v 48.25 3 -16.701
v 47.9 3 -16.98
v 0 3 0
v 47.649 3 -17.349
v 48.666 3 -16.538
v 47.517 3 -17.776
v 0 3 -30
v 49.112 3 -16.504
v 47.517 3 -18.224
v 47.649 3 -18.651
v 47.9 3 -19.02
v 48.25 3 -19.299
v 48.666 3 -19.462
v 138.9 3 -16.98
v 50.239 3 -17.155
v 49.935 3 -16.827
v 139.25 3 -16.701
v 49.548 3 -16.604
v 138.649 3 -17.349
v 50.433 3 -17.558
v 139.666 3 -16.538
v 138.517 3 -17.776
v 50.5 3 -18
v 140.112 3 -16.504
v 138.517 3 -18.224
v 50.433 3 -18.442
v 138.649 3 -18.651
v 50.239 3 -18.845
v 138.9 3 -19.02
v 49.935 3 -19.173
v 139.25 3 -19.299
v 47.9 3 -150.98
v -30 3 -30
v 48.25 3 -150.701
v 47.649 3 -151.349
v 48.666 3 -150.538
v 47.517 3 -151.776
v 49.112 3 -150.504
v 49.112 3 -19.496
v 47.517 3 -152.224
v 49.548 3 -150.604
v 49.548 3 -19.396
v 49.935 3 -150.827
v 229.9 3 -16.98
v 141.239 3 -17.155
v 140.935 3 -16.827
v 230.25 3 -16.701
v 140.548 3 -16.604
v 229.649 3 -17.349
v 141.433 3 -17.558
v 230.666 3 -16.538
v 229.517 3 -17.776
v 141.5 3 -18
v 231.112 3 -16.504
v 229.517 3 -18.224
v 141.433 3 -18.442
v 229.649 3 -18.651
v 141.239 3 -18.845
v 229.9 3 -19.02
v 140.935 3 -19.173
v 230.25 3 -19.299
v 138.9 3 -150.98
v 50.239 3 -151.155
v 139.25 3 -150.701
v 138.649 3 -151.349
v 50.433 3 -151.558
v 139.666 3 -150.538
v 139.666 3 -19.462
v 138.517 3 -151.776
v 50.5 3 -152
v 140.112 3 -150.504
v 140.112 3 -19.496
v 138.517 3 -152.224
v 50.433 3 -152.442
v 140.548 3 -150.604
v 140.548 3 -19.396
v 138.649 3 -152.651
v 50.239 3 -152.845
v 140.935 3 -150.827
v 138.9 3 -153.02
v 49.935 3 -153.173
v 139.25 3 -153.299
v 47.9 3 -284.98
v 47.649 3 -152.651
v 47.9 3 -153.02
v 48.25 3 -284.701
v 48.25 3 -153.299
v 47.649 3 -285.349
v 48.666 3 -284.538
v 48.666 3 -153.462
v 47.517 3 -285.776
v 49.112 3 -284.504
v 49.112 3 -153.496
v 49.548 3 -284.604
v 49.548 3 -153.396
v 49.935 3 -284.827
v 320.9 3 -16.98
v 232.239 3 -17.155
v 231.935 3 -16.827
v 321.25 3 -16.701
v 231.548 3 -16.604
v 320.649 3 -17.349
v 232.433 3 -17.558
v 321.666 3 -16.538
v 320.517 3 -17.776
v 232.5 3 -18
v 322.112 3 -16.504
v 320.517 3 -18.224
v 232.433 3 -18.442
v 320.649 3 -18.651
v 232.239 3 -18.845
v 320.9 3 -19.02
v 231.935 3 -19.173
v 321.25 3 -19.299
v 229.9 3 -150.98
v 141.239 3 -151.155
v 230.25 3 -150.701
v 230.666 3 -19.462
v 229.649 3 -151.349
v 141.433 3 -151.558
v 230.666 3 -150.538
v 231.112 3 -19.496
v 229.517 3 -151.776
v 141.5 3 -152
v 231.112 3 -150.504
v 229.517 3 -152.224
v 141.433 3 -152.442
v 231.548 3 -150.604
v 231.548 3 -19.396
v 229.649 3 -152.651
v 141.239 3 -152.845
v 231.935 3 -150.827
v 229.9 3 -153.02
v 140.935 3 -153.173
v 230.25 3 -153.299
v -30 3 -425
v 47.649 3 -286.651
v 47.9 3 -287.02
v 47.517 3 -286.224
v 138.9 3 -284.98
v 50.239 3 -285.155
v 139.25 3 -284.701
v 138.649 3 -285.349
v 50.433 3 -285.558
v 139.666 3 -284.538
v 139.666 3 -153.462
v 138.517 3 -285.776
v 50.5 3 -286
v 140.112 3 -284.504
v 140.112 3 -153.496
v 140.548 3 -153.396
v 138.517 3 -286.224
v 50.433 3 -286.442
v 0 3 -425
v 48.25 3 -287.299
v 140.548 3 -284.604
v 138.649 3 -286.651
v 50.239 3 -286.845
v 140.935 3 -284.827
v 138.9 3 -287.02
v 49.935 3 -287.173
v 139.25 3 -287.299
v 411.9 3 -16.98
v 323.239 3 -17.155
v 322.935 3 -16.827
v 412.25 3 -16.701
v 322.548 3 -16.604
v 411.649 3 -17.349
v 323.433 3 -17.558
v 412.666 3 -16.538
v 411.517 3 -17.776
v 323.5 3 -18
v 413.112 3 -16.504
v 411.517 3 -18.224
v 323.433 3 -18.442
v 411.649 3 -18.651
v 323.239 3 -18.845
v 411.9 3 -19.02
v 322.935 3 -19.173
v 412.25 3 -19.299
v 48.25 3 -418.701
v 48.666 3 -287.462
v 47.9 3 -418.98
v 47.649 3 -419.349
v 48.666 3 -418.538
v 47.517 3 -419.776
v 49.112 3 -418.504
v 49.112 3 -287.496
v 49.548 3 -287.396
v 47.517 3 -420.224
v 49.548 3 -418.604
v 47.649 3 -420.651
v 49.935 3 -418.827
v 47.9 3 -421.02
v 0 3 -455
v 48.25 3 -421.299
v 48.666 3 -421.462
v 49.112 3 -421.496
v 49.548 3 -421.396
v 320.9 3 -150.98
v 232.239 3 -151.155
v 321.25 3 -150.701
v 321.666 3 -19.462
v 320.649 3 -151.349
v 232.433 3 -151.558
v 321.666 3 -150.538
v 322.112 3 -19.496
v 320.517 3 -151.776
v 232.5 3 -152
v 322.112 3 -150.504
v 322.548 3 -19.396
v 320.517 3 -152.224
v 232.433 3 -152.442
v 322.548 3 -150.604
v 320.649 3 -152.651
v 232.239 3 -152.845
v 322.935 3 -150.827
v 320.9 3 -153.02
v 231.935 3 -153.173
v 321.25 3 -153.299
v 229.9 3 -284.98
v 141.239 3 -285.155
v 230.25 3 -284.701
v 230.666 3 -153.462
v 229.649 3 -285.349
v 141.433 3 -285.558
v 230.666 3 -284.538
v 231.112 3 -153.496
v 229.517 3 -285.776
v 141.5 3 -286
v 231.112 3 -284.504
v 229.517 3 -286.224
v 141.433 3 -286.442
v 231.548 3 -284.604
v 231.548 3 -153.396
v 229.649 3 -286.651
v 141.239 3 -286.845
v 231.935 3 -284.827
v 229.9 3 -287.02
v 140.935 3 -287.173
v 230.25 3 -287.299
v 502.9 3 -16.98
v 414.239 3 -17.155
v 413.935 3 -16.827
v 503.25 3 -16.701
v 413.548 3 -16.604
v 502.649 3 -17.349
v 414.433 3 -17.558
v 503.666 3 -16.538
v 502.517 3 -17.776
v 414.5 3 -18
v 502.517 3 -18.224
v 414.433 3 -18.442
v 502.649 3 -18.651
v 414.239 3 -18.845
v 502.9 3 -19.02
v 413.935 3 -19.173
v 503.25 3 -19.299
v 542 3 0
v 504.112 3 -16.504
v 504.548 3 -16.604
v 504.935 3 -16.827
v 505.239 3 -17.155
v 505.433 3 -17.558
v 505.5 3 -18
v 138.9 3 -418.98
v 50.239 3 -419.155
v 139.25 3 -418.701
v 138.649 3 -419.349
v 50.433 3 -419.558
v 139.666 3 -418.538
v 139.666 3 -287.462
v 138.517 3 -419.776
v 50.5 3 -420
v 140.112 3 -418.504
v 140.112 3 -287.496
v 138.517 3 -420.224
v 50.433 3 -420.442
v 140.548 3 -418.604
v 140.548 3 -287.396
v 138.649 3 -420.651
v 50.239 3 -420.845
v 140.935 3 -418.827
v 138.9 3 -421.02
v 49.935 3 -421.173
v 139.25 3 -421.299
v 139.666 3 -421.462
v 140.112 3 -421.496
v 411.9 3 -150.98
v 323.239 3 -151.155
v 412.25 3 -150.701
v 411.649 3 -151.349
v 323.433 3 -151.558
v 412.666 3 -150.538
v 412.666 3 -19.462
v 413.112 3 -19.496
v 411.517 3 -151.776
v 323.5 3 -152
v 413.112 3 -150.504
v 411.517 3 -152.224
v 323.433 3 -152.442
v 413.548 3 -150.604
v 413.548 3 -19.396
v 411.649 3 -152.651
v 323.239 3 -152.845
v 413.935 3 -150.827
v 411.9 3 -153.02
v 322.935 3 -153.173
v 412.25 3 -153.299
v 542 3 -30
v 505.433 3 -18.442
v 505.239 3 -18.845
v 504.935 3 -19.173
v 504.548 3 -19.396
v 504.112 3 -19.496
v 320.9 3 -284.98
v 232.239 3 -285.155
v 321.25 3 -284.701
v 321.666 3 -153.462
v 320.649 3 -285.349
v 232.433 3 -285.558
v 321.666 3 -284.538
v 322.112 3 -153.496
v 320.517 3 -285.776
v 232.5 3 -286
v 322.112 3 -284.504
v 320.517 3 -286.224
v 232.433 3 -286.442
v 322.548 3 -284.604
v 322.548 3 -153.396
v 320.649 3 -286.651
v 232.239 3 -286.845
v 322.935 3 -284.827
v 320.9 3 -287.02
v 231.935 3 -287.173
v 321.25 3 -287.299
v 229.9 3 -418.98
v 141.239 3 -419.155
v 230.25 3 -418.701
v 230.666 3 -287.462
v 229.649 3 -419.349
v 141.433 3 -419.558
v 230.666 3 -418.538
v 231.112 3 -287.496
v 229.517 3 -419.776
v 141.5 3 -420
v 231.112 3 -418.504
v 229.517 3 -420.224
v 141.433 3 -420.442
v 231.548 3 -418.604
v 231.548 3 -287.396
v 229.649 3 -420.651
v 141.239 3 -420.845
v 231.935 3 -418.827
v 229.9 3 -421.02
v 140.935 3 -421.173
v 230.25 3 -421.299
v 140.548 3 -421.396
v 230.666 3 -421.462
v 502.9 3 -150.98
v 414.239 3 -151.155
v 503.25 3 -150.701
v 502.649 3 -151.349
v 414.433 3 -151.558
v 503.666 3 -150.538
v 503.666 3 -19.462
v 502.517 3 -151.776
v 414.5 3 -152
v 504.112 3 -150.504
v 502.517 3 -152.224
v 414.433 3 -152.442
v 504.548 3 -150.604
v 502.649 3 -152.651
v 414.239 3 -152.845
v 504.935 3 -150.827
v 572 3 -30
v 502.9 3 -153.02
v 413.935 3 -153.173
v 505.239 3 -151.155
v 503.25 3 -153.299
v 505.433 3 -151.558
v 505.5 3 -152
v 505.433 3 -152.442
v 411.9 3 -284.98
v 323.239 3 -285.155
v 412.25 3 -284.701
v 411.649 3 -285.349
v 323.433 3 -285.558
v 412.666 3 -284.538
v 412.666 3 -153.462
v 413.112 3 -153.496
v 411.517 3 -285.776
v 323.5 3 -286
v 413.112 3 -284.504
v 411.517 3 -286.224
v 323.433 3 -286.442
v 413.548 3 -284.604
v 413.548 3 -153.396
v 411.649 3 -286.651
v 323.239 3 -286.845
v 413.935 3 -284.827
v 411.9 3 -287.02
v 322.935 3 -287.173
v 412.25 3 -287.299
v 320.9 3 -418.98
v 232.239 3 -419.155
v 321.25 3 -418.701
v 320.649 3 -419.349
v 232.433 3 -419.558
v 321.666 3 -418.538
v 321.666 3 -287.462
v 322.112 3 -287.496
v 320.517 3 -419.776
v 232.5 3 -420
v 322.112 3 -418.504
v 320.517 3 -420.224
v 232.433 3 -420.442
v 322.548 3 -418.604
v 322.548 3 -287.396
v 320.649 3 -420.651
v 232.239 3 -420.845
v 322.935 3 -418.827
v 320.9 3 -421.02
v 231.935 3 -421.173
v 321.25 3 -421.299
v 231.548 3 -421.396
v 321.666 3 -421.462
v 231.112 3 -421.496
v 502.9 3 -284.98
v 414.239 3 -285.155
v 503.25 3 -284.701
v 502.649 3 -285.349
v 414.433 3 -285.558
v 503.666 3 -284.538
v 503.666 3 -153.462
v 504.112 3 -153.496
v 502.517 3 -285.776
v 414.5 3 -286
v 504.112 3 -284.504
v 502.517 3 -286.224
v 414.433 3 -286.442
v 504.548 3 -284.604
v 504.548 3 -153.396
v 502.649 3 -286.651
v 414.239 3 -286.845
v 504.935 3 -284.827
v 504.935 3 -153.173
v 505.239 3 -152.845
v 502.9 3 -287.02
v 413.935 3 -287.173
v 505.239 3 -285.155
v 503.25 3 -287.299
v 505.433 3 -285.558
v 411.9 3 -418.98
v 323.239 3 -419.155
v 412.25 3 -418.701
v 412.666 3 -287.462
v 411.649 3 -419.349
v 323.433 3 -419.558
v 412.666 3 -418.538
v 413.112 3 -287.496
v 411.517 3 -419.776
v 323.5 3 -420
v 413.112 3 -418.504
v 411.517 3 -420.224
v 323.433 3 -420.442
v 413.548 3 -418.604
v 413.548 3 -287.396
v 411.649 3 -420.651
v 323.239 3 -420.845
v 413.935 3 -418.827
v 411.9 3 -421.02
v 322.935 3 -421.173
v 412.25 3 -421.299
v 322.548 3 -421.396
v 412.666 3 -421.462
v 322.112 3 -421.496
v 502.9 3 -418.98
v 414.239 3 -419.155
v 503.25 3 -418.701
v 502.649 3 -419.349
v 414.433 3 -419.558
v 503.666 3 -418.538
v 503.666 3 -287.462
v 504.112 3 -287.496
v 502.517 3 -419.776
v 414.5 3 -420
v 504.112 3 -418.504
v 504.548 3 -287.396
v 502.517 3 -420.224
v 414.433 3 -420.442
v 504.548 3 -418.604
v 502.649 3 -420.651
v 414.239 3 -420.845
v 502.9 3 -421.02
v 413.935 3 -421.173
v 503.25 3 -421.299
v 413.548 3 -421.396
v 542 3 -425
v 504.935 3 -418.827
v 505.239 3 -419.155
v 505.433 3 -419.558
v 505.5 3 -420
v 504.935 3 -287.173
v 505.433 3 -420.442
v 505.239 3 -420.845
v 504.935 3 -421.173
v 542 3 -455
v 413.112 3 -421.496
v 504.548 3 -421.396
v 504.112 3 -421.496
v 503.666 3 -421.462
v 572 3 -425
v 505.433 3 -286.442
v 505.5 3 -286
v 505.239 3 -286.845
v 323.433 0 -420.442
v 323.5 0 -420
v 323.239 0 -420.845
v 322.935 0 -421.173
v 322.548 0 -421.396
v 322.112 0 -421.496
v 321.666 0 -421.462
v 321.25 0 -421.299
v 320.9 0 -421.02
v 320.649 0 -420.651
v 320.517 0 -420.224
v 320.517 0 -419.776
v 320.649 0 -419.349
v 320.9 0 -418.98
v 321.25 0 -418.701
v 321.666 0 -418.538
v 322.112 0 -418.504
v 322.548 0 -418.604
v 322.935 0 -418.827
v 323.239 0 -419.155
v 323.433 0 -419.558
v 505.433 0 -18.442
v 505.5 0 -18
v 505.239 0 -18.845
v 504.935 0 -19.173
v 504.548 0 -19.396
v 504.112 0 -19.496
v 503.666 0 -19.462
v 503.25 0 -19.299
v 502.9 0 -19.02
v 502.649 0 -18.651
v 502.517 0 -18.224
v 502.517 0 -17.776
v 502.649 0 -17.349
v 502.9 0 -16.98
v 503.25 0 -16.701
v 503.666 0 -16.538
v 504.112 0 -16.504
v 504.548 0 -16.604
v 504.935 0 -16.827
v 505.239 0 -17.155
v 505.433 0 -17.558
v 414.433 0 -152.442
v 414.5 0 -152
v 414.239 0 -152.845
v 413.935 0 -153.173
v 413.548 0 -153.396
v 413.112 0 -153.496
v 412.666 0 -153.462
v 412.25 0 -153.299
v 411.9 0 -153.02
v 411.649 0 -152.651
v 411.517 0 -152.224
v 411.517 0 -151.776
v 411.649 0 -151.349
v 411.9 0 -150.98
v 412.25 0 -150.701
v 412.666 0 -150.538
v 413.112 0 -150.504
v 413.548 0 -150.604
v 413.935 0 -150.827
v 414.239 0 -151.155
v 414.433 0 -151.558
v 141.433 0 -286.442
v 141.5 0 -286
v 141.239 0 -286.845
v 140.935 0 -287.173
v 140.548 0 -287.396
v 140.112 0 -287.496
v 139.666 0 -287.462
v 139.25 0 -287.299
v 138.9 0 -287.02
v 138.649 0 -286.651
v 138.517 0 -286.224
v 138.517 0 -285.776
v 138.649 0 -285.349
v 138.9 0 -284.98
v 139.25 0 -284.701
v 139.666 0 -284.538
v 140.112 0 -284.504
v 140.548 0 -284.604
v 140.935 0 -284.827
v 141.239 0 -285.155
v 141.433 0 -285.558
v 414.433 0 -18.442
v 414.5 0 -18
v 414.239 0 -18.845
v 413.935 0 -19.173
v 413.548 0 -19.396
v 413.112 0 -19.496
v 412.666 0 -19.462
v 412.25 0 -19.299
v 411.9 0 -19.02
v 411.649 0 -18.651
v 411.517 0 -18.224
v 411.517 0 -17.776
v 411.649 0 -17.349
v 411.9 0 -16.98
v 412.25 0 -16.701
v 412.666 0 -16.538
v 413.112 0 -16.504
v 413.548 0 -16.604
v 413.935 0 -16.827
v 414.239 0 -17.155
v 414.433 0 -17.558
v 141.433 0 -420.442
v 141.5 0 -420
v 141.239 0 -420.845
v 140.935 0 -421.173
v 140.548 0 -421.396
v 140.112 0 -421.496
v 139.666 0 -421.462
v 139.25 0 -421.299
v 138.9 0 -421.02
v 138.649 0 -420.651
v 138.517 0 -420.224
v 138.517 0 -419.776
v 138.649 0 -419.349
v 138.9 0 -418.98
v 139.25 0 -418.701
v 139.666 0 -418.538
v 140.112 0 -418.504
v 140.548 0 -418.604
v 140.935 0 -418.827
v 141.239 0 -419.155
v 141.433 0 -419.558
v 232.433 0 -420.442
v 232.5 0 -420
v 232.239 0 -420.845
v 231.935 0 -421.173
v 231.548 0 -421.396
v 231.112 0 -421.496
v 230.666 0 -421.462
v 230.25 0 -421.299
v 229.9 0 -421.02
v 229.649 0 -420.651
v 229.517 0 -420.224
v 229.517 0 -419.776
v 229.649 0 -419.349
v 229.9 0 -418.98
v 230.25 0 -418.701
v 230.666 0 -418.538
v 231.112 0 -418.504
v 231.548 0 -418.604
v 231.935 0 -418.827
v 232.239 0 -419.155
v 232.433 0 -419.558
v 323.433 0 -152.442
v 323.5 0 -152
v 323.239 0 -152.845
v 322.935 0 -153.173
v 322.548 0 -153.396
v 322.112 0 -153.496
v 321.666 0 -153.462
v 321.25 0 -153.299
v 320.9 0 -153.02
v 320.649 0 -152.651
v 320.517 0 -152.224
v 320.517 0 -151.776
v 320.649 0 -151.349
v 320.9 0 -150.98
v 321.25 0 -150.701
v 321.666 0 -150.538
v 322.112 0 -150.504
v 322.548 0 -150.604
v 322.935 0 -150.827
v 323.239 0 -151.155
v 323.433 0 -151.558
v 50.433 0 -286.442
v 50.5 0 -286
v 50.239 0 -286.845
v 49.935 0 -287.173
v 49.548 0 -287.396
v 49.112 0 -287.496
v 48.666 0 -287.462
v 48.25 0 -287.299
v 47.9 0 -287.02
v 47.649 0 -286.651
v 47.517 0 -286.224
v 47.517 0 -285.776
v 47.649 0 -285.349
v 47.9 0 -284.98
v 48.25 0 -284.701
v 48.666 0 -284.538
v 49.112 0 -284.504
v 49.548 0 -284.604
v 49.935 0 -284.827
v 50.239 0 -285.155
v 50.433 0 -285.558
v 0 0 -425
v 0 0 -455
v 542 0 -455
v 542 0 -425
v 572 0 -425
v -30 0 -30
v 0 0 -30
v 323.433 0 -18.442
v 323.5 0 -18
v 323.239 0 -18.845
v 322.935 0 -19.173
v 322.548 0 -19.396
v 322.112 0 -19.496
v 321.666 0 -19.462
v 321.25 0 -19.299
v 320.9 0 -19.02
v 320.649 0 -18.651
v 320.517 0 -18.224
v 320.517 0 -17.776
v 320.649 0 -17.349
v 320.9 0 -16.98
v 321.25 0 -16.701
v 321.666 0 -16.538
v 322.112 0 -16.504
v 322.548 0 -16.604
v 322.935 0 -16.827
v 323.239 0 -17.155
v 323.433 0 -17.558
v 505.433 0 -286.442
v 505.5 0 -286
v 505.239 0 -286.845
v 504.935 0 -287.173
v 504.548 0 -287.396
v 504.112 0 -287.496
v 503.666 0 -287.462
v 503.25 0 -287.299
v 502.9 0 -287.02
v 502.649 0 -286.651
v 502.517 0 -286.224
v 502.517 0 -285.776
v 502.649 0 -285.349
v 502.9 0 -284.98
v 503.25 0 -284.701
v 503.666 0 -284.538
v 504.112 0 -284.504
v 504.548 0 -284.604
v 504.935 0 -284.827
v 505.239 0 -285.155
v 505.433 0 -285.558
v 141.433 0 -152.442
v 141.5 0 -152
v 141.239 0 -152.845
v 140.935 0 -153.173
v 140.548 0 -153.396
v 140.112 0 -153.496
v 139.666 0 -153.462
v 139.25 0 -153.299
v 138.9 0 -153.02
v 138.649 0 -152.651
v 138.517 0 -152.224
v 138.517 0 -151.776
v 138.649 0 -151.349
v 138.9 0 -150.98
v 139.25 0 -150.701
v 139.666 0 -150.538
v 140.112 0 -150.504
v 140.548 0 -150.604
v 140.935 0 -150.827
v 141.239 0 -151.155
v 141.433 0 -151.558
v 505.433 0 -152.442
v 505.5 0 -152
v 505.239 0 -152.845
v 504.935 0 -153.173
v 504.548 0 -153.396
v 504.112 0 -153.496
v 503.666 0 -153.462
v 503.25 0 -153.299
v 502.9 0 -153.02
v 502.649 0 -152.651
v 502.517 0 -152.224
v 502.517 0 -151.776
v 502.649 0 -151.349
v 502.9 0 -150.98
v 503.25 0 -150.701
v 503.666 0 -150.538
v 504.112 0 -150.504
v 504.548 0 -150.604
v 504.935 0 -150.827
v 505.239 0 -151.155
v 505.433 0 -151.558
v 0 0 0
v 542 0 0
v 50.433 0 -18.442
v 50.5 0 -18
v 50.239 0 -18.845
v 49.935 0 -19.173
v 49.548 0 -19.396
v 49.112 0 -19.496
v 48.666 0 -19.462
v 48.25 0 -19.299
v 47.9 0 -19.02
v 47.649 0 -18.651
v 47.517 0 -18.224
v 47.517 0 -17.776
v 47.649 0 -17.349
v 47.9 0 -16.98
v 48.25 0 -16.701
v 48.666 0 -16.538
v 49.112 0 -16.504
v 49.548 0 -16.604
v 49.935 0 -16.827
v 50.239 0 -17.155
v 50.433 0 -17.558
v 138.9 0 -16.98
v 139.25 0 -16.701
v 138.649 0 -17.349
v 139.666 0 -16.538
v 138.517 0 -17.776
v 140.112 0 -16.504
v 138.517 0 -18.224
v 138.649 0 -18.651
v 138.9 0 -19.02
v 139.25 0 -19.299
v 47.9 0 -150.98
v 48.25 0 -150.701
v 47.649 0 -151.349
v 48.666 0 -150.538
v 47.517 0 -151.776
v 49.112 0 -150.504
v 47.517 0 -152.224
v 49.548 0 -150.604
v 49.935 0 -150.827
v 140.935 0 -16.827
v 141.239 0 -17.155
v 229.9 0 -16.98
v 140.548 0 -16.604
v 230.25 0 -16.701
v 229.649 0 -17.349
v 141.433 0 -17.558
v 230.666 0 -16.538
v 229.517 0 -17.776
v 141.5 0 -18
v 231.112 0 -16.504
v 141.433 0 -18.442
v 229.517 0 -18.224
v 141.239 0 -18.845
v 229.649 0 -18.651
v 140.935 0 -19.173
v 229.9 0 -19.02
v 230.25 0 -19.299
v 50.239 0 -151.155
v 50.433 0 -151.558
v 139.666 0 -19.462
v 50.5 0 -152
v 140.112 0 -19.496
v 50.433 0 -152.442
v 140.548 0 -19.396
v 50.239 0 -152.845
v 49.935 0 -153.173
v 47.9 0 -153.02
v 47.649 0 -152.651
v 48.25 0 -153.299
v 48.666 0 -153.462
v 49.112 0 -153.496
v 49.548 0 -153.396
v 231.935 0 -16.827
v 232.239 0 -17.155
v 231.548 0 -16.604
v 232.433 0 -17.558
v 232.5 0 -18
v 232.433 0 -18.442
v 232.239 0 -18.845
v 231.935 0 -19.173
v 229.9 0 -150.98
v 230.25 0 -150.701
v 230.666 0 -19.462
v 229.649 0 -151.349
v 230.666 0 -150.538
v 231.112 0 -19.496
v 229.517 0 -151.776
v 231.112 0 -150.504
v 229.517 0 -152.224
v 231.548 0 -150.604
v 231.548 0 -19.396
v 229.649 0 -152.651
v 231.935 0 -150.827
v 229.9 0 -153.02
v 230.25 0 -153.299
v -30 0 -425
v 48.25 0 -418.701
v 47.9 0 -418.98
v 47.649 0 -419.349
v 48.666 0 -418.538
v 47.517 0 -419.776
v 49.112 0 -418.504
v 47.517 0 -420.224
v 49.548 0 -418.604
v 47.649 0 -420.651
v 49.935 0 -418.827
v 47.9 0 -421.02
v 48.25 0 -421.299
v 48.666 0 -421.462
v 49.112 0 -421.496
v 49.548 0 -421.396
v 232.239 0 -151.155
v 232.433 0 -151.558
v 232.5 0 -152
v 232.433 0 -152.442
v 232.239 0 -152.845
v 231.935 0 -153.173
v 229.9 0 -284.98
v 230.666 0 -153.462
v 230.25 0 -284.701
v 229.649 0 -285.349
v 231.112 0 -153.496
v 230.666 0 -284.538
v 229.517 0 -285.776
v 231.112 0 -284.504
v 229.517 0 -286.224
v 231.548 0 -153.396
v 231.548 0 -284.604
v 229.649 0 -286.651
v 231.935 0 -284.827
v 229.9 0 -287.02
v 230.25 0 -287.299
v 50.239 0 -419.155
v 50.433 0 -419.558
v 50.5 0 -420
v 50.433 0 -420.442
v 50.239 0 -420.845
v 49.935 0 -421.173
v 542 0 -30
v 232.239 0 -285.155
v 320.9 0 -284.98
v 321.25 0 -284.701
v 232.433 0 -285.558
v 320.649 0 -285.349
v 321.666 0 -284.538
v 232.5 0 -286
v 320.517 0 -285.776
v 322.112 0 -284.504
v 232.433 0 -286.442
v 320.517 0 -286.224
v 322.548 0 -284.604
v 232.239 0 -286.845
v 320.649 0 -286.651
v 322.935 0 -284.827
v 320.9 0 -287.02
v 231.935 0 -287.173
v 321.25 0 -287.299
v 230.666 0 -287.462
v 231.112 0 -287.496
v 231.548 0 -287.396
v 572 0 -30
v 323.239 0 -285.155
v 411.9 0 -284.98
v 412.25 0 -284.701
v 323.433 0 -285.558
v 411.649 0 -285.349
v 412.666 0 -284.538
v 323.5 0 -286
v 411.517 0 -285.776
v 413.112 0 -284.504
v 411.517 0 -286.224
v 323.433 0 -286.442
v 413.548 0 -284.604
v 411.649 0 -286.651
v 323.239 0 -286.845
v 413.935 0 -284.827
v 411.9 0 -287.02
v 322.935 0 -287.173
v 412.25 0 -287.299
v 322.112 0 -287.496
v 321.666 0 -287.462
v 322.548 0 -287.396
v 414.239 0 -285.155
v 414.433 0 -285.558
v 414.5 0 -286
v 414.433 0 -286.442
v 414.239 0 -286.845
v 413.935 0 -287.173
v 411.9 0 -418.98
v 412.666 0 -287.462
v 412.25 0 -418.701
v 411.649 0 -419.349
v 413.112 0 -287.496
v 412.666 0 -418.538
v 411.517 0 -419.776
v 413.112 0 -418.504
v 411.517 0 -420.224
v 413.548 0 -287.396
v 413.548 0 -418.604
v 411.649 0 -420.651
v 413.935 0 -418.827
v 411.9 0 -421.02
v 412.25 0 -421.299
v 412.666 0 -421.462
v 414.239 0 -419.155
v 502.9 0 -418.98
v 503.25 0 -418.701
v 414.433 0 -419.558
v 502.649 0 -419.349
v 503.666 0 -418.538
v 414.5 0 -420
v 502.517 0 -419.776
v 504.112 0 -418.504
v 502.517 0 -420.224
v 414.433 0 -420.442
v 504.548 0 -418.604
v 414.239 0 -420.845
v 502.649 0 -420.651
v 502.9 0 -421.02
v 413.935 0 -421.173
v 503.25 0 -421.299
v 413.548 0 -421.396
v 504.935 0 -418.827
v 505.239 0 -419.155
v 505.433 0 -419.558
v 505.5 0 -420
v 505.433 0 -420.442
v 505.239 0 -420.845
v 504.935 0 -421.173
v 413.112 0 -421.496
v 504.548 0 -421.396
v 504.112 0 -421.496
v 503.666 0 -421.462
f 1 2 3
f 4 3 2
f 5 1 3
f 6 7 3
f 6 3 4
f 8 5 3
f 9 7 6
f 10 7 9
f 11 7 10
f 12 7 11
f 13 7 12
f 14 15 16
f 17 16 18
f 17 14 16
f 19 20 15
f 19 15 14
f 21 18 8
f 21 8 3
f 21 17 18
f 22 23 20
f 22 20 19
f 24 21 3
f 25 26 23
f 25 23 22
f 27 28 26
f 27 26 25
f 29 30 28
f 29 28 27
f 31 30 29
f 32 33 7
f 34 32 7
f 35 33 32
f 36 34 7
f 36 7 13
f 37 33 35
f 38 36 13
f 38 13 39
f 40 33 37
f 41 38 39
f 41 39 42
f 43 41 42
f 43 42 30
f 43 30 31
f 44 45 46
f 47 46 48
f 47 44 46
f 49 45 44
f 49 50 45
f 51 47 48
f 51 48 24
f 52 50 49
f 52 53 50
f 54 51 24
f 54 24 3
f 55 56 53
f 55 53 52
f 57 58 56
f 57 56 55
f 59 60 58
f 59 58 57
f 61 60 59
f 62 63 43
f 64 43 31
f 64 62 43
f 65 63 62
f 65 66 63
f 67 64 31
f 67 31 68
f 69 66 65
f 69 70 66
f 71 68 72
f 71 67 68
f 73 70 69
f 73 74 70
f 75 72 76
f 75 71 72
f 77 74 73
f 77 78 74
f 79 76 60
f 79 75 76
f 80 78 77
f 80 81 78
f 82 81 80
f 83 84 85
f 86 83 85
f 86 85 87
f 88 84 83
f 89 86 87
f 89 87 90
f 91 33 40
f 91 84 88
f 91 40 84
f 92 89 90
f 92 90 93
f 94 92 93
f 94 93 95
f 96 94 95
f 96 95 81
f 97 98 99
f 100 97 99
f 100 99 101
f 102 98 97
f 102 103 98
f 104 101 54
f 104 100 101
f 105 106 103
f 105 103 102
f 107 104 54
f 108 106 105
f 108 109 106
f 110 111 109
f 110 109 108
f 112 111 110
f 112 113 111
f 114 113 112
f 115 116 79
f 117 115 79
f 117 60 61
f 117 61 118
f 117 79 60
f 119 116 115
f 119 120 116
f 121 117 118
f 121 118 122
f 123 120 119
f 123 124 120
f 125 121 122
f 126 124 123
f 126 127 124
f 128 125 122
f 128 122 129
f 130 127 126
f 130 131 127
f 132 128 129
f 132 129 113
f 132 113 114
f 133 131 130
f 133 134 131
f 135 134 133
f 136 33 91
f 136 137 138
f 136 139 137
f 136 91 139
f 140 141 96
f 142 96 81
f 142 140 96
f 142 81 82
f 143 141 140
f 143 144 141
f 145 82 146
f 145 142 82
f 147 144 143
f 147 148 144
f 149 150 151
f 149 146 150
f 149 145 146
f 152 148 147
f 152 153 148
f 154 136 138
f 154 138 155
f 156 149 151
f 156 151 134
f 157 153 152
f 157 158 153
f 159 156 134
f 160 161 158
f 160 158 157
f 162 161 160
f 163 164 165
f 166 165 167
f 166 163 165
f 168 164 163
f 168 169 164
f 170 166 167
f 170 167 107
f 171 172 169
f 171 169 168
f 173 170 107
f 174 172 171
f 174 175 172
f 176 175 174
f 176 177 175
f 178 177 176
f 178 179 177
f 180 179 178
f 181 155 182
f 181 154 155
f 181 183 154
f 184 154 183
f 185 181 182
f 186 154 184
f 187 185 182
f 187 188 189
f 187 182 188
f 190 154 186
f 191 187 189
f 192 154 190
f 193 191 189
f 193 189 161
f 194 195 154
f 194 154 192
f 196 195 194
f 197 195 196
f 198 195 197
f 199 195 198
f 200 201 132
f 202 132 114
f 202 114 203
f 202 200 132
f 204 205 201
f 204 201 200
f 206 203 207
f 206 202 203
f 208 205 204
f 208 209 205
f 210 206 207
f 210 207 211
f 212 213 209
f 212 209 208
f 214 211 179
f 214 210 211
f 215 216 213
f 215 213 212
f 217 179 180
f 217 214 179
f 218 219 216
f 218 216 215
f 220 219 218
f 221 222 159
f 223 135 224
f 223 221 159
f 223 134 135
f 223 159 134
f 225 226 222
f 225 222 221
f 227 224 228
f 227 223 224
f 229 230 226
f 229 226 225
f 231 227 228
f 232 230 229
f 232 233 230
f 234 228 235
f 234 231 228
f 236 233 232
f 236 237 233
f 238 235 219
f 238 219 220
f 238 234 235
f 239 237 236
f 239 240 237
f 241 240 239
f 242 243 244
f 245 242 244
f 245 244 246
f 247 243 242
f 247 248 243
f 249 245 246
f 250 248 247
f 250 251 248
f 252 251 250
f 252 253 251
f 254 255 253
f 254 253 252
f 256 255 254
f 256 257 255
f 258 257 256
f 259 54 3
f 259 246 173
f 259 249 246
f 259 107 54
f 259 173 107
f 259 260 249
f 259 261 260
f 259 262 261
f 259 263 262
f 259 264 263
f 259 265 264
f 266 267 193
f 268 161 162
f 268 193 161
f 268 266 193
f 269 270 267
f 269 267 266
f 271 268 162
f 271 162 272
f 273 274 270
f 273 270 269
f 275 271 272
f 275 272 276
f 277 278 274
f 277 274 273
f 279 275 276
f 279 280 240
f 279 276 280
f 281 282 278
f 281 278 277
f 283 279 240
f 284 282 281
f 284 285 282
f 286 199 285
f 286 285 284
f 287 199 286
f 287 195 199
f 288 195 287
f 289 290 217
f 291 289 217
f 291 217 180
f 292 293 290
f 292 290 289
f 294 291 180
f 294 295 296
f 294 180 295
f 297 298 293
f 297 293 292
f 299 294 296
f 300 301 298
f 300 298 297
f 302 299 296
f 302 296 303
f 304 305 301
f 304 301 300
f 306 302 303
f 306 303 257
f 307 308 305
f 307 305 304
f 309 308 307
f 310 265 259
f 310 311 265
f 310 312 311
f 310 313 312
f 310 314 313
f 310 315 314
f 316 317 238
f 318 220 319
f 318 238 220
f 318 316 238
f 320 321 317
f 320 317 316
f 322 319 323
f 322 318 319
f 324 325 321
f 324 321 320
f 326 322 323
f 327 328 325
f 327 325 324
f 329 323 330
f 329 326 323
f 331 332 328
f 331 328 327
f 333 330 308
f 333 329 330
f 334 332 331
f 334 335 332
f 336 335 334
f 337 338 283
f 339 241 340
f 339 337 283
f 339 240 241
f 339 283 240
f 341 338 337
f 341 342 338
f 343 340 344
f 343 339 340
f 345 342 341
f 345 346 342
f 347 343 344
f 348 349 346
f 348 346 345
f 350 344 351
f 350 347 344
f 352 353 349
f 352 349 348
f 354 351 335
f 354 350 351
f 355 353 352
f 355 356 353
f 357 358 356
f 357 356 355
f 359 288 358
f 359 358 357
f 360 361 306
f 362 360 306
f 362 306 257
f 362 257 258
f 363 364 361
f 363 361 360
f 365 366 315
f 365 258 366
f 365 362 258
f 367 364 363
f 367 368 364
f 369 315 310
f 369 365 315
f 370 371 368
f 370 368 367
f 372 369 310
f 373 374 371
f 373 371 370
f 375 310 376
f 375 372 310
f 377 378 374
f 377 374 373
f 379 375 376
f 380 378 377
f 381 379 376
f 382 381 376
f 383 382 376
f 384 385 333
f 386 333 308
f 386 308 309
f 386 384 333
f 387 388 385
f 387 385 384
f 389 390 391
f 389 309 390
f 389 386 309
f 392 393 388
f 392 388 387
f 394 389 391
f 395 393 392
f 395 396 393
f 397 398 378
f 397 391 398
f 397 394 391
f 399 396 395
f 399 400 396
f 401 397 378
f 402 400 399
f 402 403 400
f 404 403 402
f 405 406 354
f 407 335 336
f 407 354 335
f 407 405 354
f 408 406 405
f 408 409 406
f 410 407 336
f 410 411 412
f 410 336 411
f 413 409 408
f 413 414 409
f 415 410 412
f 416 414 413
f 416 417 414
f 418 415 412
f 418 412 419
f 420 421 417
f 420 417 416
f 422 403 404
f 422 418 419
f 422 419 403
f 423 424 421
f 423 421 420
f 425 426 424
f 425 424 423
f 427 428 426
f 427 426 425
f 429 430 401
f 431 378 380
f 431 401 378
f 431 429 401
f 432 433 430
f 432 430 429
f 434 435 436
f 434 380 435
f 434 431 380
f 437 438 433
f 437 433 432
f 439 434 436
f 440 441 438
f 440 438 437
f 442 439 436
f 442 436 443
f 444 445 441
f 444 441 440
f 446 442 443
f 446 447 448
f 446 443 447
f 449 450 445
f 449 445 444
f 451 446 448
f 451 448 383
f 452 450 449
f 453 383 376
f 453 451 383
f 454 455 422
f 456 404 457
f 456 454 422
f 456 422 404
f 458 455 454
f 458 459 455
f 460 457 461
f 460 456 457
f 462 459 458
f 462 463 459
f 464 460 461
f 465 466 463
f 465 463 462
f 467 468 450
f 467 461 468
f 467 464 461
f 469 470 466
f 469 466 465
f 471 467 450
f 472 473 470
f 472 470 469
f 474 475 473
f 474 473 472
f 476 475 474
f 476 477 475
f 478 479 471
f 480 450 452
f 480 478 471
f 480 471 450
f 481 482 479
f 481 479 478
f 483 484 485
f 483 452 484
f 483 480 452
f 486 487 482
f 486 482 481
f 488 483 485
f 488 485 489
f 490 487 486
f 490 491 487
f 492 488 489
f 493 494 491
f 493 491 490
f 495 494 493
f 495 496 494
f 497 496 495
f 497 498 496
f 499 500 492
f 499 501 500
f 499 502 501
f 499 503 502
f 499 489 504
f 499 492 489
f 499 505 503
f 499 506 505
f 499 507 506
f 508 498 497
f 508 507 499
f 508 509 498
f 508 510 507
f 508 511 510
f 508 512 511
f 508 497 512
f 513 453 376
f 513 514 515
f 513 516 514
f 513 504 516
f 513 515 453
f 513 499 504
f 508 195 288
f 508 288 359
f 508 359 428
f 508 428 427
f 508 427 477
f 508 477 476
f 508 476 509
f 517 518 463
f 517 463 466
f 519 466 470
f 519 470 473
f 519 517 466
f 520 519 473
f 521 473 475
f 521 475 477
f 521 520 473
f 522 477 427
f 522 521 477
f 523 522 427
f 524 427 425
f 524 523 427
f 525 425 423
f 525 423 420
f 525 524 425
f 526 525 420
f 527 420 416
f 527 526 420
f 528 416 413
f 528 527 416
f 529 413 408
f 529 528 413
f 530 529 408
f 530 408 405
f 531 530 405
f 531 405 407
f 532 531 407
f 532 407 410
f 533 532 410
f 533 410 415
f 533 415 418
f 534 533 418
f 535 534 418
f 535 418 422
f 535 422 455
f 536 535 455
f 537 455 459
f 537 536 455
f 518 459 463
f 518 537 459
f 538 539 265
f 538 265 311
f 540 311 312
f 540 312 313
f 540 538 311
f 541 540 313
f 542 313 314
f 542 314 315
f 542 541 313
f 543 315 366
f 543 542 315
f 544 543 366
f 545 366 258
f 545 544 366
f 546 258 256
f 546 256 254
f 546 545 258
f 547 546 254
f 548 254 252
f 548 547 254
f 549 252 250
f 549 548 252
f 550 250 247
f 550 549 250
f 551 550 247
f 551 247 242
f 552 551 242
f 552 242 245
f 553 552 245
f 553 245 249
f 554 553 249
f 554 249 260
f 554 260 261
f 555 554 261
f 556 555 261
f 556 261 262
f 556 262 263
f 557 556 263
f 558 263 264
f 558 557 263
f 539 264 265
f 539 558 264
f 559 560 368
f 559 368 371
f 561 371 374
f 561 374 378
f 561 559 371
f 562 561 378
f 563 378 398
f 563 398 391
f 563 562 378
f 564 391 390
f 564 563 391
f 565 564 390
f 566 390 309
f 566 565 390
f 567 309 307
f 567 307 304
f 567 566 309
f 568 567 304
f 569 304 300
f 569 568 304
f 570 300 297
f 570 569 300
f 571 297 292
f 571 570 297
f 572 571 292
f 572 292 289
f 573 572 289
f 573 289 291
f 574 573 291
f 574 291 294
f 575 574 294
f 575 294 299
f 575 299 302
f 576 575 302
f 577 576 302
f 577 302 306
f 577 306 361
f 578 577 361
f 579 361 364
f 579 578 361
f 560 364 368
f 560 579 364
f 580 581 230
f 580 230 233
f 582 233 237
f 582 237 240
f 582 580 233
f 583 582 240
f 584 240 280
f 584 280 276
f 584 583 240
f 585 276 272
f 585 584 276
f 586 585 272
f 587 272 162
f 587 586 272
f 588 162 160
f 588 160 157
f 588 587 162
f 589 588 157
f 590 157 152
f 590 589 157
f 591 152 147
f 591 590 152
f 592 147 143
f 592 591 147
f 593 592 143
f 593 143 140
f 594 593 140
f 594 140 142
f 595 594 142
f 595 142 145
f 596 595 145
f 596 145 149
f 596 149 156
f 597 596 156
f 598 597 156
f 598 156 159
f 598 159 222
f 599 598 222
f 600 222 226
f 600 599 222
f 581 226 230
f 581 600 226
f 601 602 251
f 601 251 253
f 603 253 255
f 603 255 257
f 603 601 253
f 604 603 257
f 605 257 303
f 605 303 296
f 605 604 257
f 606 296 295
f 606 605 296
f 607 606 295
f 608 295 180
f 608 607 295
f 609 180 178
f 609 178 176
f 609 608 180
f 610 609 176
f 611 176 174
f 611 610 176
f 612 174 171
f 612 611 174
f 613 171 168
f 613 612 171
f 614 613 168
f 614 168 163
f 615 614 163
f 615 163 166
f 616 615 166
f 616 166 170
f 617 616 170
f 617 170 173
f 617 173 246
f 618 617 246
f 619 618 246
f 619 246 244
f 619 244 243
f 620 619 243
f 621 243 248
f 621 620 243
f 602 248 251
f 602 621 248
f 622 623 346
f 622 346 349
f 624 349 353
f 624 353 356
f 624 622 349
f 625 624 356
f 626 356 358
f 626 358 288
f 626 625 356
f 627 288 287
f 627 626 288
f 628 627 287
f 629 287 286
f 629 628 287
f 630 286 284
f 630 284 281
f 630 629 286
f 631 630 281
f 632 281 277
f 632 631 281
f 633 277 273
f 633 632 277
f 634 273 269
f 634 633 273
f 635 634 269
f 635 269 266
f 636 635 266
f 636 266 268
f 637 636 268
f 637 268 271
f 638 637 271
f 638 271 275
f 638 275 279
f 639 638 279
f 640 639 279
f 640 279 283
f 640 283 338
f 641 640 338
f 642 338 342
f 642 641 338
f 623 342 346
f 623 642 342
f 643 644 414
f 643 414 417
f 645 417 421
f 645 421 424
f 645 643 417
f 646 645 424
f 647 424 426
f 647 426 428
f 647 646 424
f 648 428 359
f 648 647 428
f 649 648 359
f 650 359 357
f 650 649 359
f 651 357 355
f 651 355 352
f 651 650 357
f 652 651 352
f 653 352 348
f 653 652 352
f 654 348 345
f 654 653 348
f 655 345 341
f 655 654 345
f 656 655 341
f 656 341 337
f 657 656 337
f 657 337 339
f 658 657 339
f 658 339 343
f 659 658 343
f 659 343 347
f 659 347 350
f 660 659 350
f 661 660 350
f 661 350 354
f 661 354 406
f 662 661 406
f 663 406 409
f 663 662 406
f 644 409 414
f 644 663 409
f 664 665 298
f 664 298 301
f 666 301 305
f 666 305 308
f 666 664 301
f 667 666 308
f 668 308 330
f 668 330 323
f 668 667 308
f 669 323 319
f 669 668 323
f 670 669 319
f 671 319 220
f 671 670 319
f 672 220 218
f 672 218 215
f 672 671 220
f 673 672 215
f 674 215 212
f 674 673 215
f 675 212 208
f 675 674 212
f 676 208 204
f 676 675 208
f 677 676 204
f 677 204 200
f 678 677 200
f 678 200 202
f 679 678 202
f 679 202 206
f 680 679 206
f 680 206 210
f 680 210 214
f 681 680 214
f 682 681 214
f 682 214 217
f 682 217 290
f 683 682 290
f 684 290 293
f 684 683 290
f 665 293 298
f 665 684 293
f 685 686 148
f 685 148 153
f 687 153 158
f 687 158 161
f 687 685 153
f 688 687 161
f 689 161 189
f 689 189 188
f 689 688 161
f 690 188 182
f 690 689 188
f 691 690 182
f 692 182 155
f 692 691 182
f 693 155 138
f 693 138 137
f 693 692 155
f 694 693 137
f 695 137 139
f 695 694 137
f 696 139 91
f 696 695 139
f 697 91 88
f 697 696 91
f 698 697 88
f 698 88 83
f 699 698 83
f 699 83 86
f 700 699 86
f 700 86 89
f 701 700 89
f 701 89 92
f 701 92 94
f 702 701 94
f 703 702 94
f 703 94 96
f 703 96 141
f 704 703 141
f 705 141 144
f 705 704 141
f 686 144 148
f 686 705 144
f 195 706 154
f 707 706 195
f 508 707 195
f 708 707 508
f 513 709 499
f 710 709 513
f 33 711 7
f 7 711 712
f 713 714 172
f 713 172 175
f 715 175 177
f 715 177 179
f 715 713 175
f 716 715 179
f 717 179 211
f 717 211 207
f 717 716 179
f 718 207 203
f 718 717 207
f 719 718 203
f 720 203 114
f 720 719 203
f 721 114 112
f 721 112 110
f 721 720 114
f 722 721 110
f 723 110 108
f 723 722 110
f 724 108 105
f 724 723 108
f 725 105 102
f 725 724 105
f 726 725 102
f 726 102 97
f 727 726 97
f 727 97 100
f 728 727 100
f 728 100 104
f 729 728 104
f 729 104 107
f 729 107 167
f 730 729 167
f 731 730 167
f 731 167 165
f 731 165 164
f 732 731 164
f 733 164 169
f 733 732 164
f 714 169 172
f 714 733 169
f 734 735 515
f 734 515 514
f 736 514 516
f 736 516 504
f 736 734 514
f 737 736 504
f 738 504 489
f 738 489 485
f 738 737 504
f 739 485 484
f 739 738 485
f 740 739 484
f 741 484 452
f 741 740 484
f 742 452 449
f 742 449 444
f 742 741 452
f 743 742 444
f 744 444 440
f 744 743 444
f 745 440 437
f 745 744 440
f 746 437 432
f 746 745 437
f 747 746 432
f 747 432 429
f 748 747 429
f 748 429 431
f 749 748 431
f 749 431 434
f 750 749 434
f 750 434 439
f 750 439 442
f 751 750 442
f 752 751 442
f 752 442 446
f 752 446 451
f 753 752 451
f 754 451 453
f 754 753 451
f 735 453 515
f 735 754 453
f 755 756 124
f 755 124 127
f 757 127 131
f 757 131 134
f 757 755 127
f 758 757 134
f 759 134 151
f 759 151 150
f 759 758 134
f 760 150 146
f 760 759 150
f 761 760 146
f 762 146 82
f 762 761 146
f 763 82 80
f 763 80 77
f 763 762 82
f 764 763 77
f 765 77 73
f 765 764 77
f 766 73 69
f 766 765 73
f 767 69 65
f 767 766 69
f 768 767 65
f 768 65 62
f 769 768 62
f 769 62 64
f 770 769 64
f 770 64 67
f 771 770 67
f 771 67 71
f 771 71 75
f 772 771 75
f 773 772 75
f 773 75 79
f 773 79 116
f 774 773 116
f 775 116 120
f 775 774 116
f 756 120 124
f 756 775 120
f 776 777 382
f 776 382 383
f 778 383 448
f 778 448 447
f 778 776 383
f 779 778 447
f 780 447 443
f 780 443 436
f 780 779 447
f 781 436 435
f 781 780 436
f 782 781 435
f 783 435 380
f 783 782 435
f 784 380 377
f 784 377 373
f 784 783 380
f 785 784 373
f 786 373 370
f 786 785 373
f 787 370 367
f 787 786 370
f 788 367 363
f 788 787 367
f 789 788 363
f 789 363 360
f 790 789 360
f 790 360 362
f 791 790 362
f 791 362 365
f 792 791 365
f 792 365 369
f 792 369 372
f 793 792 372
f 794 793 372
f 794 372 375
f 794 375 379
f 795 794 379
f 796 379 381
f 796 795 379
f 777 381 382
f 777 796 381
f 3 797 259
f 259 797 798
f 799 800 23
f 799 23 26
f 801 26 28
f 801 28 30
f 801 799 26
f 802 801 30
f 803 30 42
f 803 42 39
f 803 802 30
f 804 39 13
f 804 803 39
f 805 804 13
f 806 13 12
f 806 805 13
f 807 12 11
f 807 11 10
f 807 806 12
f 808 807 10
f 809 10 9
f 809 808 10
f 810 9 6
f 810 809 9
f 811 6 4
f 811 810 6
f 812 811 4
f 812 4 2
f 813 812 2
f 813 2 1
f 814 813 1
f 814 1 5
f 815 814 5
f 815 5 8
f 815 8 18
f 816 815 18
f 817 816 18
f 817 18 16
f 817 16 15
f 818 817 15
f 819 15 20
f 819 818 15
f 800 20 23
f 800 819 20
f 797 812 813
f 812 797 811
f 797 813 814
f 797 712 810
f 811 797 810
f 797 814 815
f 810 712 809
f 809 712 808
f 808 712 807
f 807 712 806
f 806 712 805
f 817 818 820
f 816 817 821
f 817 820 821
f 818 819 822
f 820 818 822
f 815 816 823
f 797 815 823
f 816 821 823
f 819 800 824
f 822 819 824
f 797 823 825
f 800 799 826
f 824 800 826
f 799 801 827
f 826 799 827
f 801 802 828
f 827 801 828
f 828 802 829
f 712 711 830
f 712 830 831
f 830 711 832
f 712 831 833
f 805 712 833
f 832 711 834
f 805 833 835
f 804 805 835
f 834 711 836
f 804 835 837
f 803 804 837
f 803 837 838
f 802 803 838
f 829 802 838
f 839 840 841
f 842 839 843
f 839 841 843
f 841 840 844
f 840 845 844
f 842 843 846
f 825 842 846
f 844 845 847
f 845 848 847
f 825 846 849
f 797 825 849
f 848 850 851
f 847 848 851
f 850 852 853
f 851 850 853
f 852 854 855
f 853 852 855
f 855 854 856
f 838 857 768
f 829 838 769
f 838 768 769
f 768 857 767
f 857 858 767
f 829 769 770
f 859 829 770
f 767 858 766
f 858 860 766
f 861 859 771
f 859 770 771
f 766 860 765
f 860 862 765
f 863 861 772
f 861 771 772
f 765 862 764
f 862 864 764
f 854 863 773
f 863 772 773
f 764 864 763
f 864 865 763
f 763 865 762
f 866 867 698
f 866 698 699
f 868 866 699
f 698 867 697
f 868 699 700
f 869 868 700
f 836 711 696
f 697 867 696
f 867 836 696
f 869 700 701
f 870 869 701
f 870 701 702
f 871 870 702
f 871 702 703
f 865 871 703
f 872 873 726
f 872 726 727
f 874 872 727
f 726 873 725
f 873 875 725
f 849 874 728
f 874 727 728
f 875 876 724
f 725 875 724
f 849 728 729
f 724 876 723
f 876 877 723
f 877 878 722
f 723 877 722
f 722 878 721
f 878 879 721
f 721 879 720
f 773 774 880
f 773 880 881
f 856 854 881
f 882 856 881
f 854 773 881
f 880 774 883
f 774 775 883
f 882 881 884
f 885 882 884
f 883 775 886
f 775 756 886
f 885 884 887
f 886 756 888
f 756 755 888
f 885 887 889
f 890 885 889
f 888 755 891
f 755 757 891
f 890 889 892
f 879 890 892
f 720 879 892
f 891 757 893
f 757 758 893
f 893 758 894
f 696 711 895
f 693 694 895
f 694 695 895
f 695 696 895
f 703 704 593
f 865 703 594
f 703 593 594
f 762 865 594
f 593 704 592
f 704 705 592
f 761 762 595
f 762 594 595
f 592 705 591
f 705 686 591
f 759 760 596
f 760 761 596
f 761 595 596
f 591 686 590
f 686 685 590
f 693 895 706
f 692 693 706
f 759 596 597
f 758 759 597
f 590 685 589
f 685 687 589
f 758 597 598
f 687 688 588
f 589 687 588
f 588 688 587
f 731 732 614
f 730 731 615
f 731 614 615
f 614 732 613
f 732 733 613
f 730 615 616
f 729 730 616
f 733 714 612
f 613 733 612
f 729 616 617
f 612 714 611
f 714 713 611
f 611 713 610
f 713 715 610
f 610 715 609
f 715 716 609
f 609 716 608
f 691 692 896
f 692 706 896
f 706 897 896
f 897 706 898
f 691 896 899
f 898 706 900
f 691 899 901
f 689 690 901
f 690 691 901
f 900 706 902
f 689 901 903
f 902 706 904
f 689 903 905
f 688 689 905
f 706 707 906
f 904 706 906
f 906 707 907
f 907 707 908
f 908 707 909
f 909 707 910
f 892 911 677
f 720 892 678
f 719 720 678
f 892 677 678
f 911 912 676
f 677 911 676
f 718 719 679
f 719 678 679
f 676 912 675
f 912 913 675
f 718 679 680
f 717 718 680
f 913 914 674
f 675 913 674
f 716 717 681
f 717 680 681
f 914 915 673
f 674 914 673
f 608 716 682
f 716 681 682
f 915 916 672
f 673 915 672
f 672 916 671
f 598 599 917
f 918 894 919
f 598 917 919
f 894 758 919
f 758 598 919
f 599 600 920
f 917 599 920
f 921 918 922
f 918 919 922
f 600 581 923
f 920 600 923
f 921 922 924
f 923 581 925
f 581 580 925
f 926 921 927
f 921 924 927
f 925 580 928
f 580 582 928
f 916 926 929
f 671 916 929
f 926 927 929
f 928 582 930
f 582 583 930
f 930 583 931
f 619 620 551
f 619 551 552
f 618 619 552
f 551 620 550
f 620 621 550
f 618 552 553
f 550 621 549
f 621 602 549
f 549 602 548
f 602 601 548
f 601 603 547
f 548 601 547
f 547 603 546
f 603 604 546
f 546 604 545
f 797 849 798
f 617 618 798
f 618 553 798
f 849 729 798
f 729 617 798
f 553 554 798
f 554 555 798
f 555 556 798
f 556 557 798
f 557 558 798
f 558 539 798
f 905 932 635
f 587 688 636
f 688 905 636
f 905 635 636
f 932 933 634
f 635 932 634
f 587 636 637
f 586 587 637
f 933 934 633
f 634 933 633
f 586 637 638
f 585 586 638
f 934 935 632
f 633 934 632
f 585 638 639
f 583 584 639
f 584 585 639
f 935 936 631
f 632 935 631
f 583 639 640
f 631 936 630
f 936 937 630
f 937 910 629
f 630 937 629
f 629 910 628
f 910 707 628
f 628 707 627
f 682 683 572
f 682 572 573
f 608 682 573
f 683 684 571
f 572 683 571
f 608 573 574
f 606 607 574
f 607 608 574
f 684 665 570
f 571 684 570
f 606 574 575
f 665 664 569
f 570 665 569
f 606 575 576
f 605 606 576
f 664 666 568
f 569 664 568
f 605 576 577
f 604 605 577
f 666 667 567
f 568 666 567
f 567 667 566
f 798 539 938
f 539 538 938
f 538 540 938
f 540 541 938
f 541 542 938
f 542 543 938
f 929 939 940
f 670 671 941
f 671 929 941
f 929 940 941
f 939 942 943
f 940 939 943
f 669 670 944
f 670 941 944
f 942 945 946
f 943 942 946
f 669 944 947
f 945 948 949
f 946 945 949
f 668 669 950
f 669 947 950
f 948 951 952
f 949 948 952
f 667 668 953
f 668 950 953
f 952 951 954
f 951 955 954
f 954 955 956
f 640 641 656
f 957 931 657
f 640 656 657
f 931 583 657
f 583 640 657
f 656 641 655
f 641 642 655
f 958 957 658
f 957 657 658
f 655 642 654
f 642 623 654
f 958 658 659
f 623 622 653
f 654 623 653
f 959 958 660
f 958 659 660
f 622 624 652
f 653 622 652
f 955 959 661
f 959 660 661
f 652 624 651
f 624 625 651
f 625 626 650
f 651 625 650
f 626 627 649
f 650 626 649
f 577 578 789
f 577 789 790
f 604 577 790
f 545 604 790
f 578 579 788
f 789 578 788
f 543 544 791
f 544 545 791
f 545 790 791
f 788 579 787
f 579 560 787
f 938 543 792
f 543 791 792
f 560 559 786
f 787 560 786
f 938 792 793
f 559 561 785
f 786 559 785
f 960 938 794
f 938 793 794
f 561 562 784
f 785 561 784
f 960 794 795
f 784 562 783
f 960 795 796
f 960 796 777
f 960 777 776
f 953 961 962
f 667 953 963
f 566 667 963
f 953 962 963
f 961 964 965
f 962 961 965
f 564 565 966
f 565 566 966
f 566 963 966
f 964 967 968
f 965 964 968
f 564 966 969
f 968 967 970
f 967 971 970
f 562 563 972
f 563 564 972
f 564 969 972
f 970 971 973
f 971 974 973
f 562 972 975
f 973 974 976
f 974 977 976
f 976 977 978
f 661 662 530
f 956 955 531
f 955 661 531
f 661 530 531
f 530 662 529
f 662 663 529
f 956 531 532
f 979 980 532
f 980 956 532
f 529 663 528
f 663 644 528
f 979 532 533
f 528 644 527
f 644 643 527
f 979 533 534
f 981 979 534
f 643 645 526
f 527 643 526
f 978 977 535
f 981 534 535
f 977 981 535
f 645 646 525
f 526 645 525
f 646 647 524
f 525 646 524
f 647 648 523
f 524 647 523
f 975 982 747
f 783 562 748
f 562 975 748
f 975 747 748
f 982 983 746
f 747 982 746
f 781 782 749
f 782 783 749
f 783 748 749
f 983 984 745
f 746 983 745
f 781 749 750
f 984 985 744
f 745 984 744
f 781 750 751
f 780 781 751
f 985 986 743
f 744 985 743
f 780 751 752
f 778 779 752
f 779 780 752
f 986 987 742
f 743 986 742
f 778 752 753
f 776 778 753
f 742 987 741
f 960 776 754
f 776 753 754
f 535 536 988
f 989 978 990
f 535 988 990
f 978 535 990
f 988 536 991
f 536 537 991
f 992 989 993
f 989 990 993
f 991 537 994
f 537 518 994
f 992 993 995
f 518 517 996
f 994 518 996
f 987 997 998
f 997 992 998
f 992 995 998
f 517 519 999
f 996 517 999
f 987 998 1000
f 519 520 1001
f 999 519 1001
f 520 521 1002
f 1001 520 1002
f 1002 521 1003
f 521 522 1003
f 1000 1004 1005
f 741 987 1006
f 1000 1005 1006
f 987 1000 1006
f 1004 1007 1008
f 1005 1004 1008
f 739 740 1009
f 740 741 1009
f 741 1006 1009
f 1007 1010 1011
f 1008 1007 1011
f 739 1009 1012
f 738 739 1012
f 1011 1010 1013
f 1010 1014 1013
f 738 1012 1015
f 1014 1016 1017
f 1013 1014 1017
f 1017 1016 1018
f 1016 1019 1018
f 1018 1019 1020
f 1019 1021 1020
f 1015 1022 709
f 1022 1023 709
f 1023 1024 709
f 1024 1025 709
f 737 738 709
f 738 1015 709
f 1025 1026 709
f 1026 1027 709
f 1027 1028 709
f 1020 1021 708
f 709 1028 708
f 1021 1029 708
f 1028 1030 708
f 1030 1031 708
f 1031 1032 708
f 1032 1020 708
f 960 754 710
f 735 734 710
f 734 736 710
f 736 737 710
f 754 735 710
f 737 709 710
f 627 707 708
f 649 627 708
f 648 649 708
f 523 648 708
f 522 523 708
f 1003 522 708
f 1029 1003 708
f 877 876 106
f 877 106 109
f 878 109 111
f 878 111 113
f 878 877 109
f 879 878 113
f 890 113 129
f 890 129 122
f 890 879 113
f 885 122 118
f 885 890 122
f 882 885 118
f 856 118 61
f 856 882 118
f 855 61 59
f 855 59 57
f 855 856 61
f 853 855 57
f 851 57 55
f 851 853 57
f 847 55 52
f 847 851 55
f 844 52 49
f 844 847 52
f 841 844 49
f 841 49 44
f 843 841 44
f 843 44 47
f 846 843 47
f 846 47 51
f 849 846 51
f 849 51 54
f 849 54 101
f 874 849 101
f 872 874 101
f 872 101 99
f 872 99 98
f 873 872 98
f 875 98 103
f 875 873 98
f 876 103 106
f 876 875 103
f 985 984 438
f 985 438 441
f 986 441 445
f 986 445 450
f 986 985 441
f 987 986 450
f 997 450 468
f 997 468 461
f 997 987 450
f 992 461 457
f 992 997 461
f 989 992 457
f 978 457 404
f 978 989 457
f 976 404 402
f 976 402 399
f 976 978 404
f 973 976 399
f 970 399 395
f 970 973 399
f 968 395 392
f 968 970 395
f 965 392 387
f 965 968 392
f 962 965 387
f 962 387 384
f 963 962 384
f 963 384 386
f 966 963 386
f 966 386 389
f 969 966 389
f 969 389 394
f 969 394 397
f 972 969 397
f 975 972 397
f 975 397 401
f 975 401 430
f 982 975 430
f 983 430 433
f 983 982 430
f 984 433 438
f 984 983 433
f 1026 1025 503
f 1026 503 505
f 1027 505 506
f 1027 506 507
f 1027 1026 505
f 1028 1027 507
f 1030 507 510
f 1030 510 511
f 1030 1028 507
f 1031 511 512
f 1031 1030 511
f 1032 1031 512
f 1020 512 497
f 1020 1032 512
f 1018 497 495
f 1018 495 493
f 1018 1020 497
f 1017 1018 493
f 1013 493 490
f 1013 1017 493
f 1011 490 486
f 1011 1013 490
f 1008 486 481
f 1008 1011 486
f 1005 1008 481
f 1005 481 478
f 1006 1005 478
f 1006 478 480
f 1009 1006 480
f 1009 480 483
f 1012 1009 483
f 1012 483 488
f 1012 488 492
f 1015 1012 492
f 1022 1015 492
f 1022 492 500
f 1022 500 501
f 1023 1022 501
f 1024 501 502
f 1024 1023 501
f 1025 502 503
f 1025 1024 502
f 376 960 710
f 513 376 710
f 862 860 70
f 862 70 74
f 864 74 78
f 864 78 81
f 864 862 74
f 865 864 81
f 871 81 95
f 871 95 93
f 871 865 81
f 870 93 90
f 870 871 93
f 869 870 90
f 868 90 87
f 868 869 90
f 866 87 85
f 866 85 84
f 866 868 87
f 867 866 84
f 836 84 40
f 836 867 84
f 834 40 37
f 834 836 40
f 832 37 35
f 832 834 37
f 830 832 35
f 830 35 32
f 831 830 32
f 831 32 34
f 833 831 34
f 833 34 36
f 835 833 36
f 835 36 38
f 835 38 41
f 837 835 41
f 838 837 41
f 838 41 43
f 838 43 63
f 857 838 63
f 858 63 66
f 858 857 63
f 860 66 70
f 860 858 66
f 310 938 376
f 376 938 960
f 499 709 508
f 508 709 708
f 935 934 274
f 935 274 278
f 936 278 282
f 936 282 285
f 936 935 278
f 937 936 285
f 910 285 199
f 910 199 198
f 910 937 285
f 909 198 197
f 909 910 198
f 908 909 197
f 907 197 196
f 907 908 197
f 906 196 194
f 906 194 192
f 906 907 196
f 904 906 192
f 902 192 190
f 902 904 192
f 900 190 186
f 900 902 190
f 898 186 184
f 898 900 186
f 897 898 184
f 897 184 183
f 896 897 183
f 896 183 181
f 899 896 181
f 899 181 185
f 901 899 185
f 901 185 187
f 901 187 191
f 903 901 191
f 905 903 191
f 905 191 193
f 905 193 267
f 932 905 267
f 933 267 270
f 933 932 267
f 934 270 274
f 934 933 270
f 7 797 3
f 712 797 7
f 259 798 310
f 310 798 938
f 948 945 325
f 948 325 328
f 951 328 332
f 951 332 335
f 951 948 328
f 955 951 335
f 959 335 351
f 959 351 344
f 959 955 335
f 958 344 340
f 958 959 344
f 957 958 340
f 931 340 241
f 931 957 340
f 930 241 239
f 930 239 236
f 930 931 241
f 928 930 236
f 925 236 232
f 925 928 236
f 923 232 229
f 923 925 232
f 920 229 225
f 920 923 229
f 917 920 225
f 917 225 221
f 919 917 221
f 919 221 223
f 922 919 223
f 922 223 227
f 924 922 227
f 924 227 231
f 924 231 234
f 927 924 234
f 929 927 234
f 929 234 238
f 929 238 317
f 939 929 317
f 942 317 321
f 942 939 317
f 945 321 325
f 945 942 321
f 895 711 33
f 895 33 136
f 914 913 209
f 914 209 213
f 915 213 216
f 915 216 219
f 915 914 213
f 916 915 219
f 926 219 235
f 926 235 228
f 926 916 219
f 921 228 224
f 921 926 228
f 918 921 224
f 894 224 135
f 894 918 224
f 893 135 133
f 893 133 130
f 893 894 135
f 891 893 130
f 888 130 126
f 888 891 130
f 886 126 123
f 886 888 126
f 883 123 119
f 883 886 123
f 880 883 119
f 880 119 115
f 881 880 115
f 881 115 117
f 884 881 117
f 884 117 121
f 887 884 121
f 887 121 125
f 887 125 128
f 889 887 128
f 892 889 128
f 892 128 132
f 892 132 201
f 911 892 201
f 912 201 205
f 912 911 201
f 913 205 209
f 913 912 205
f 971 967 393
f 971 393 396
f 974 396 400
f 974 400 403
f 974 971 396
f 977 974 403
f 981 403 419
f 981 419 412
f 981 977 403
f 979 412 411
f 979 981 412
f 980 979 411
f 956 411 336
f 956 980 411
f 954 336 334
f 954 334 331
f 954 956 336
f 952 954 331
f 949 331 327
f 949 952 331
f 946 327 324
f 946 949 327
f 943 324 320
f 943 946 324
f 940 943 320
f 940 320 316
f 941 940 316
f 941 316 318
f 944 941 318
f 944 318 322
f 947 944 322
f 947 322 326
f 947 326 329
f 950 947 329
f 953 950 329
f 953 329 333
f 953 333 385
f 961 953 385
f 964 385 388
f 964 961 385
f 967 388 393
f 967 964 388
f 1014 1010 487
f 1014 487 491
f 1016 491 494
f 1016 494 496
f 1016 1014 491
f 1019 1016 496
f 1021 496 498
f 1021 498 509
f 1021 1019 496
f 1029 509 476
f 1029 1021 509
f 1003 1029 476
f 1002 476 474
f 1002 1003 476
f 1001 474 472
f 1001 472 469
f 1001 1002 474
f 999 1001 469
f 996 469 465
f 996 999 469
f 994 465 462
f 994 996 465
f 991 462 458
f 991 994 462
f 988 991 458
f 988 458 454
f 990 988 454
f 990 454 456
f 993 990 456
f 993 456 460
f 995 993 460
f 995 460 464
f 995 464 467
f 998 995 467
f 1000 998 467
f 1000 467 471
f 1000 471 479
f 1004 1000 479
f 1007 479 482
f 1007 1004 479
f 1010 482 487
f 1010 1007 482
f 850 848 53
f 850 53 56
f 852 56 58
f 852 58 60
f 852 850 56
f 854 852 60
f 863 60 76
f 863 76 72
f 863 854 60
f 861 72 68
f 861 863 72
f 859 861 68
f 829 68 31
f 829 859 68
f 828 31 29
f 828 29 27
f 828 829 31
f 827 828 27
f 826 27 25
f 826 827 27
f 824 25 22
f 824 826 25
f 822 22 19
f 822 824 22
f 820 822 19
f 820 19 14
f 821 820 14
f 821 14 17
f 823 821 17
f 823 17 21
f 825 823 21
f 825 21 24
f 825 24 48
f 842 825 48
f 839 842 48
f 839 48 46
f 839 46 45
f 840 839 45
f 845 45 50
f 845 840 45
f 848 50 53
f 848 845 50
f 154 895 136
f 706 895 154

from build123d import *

# Parameters (mm, degrees)
SKETCH1_W           = 542
SKETCH1_H           = 455
SKETCH1_R           = 1.5
BOSS_EXTRUDE1_DEPTH = 3
SKETCH2_W           = 30
SKETCH2_H           = 395
BOSS_EXTRUDE2_DEPTH = 3


with BuildPart() as part:
    # Sketch1 → Boss-Extrude1 (new body)
    with BuildSketch(Plane(origin=(0, 0, 0), x_dir=(1, 0, 0), z_dir=(0, 1, 0))):
        with Locations((271, 227.5)):
            Rectangle(SKETCH1_W, SKETCH1_H)
        with Locations((49, 18)):
            Circle(SKETCH1_R, mode=Mode.SUBTRACT)
        with Locations((140, 18)):
            Circle(SKETCH1_R, mode=Mode.SUBTRACT)
        with Locations((231, 18)):
            Circle(SKETCH1_R, mode=Mode.SUBTRACT)
        with Locations((413, 18)):
            Circle(SKETCH1_R, mode=Mode.SUBTRACT)
        with Locations((504, 18)):
            Circle(SKETCH1_R, mode=Mode.SUBTRACT)
        with Locations((322, 18)):
            Circle(SKETCH1_R, mode=Mode.SUBTRACT)
        with Locations((49, 152)):
            Circle(SKETCH1_R, mode=Mode.SUBTRACT)
        with Locations((140, 152)):
            Circle(SKETCH1_R, mode=Mode.SUBTRACT)
        with Locations((231, 152)):
            Circle(SKETCH1_R, mode=Mode.SUBTRACT)
        with Locations((322, 152)):
            Circle(SKETCH1_R, mode=Mode.SUBTRACT)
        with Locations((413, 152)):
            Circle(SKETCH1_R, mode=Mode.SUBTRACT)
        with Locations((504, 152)):
            Circle(SKETCH1_R, mode=Mode.SUBTRACT)
        with Locations((49, 286)):
            Circle(SKETCH1_R, mode=Mode.SUBTRACT)
        with Locations((140, 286)):
            Circle(SKETCH1_R, mode=Mode.SUBTRACT)
        with Locations((231, 286)):
            Circle(SKETCH1_R, mode=Mode.SUBTRACT)
        with Locations((322, 286)):
            Circle(SKETCH1_R, mode=Mode.SUBTRACT)
        with Locations((413, 286)):
            Circle(SKETCH1_R, mode=Mode.SUBTRACT)
        with Locations((504, 286)):
            Circle(SKETCH1_R, mode=Mode.SUBTRACT)
        with Locations((49, 420)):
            Circle(SKETCH1_R, mode=Mode.SUBTRACT)
        with Locations((140, 420)):
            Circle(SKETCH1_R, mode=Mode.SUBTRACT)
        with Locations((231, 420)):
            Circle(SKETCH1_R, mode=Mode.SUBTRACT)
        with Locations((322, 420)):
            Circle(SKETCH1_R, mode=Mode.SUBTRACT)
        with Locations((413, 420)):
            Circle(SKETCH1_R, mode=Mode.SUBTRACT)
        with Locations((504, 420)):
            Circle(SKETCH1_R, mode=Mode.SUBTRACT)
    extrude(amount=BOSS_EXTRUDE1_DEPTH)

    # Sketch2 → Boss-Extrude2 (add)
    with BuildSketch(Plane(origin=(0, 0, 0), x_dir=(1, 0, 0), z_dir=(0, 1, 0))):
        with Locations((-15, 227.5)):
            Rectangle(SKETCH2_W, SKETCH2_H)
        with Locations((557, 227.5)):
            Rectangle(SKETCH2_W, SKETCH2_H)
    extrude(amount=BOSS_EXTRUDE2_DEPTH)


solid = part.part
